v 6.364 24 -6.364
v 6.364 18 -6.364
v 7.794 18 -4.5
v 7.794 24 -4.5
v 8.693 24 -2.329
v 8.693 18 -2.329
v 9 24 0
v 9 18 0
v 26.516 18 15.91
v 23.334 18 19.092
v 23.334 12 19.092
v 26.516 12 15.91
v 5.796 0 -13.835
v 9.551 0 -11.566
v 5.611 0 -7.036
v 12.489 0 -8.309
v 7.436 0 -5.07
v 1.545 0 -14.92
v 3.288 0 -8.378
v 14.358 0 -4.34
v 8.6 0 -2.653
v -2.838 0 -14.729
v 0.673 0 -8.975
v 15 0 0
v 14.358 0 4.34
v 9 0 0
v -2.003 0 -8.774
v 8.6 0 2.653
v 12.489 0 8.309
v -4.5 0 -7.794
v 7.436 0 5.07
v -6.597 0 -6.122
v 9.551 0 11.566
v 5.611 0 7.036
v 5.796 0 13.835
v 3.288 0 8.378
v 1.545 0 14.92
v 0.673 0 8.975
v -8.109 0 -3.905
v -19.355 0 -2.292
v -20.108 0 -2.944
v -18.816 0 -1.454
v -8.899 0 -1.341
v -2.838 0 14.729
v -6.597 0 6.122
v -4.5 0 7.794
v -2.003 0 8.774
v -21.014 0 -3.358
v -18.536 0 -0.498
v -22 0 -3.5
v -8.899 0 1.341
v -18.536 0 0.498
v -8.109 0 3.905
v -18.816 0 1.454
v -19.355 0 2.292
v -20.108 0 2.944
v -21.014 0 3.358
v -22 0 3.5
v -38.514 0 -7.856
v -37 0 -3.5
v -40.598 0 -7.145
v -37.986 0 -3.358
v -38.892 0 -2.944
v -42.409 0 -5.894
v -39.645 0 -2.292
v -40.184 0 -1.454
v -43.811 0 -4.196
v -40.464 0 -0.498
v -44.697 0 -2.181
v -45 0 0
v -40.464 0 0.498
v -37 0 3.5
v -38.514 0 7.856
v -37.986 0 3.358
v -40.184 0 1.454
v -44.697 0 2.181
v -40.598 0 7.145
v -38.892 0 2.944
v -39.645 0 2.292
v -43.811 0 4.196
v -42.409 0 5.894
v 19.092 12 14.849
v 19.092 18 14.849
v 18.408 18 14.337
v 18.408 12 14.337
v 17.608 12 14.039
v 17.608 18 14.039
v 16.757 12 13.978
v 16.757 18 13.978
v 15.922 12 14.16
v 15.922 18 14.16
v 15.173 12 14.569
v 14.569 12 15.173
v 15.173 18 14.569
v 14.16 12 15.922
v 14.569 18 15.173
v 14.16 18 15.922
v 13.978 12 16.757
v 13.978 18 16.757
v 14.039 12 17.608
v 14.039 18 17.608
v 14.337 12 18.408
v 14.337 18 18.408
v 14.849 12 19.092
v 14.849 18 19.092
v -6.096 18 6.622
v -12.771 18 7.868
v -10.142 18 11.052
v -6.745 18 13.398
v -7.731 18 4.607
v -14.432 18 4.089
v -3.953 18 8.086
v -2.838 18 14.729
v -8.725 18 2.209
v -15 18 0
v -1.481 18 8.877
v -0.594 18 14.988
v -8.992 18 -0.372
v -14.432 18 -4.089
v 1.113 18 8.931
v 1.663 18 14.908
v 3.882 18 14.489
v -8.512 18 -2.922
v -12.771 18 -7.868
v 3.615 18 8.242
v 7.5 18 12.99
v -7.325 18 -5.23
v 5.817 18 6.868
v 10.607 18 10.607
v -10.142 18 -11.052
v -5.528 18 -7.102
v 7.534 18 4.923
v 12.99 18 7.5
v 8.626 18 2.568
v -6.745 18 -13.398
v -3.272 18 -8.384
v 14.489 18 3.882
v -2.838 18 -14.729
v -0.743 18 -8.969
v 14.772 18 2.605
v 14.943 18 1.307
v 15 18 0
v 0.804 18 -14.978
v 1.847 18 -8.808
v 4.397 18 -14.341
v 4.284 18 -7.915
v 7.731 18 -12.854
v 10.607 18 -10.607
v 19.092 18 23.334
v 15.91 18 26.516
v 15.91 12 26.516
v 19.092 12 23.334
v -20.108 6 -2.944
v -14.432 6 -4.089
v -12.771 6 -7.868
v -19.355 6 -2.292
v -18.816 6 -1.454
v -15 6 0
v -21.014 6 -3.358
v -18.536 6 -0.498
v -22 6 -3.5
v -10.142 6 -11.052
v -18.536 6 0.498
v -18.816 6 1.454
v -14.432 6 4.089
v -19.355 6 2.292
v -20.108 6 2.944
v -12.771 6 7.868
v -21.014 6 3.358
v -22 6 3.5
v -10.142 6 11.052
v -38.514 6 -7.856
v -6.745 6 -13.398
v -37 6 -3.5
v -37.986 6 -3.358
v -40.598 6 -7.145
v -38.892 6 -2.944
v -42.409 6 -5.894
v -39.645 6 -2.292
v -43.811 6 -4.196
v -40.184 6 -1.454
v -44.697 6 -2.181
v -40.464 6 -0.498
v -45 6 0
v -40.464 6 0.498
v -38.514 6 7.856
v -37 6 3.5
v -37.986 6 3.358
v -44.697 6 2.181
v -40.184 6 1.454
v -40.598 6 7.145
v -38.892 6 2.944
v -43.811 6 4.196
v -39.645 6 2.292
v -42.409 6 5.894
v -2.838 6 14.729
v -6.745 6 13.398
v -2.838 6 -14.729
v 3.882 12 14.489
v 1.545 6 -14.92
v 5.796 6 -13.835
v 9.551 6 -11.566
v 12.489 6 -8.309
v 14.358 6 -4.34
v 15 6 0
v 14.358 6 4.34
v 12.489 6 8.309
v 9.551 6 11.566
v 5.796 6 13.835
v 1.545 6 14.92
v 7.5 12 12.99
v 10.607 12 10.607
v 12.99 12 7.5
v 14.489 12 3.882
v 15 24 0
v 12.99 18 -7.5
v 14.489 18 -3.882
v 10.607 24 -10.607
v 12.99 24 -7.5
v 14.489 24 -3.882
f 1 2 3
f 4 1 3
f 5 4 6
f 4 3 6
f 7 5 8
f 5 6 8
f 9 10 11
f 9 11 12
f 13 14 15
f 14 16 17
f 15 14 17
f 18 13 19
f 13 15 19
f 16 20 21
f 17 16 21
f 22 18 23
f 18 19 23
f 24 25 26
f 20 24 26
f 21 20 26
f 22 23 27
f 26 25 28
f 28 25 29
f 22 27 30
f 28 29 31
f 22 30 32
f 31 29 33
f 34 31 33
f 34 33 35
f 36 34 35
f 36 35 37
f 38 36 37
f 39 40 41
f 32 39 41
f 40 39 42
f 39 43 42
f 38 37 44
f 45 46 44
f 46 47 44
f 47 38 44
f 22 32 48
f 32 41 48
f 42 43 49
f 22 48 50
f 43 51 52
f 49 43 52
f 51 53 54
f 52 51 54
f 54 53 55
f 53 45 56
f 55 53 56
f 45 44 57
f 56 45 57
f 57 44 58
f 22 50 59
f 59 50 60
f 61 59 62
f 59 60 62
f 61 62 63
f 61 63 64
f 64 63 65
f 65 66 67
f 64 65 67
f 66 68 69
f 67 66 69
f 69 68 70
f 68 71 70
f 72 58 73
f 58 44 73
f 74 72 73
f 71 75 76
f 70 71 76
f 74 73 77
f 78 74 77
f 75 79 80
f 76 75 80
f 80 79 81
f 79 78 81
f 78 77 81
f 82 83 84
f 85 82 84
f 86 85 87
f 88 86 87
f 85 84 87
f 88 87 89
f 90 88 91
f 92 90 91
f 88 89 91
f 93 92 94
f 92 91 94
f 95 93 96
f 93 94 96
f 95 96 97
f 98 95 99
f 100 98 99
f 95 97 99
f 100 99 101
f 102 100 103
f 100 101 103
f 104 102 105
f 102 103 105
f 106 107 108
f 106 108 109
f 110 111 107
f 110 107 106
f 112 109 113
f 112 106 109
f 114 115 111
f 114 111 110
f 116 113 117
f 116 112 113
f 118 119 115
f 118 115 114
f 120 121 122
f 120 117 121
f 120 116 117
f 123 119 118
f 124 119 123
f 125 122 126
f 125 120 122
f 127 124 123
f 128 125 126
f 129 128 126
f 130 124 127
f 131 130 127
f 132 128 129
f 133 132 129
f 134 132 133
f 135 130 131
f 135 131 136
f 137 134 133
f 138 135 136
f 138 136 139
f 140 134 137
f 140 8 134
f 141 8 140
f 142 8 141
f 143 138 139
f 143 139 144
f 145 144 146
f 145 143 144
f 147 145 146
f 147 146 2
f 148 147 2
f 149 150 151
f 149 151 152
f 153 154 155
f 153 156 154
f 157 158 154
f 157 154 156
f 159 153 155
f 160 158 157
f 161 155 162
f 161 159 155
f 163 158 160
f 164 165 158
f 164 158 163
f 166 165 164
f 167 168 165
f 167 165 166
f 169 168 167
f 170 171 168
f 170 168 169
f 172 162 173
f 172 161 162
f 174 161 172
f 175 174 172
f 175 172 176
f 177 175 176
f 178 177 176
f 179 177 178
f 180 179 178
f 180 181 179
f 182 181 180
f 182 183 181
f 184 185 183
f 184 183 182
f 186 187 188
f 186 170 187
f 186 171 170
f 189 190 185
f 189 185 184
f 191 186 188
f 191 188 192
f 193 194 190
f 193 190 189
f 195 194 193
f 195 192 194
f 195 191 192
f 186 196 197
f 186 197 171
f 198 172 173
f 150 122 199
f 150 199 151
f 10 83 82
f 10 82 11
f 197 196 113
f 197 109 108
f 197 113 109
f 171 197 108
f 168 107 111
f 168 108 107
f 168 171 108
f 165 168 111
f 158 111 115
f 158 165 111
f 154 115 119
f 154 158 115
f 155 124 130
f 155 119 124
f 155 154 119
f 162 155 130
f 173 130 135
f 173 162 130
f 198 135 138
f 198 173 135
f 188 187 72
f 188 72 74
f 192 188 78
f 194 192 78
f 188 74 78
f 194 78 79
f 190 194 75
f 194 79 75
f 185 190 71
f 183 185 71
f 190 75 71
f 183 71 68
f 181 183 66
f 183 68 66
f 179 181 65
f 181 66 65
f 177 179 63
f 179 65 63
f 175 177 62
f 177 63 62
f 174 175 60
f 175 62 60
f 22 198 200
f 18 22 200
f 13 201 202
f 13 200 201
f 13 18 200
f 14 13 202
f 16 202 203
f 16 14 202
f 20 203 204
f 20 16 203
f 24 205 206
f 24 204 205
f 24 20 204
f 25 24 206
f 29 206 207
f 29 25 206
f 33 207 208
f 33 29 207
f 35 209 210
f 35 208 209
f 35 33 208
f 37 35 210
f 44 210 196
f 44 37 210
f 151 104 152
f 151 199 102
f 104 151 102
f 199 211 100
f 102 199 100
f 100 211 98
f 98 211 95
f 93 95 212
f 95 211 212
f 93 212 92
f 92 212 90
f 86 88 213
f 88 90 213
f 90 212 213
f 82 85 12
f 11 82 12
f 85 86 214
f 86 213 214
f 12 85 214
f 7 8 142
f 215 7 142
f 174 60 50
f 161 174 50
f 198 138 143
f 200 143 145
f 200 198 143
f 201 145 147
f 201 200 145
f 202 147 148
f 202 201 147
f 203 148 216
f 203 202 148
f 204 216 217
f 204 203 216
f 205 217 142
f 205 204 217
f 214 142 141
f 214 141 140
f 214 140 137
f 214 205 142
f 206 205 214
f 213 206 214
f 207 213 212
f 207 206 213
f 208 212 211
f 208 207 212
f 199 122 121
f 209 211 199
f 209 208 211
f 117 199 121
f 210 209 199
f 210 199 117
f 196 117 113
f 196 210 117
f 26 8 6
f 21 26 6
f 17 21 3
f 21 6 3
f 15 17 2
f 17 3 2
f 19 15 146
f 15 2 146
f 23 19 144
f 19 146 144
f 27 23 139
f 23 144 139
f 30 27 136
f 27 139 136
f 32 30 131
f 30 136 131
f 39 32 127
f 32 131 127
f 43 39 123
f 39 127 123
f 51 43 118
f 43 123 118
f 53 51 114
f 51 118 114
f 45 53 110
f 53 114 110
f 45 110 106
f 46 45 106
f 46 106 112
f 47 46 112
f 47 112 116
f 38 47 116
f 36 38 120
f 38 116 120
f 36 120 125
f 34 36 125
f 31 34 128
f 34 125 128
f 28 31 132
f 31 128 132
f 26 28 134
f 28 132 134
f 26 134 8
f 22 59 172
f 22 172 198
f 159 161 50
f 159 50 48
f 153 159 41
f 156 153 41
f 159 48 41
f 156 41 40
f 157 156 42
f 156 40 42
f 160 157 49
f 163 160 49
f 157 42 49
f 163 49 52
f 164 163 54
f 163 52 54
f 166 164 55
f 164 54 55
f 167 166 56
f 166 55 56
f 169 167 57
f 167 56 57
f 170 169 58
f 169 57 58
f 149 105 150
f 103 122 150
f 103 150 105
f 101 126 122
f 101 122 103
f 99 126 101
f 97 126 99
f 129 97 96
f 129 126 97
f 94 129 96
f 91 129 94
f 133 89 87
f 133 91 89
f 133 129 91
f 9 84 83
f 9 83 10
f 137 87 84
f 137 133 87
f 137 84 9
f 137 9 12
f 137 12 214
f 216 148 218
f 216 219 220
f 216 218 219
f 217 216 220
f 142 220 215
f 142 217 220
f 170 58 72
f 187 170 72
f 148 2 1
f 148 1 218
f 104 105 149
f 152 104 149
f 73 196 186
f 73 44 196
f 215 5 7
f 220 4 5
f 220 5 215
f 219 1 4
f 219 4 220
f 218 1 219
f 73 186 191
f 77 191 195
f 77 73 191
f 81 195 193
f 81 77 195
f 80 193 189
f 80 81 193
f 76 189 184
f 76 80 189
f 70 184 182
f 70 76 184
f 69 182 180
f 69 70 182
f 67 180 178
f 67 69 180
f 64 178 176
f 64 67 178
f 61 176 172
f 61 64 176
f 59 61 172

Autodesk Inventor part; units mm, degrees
ref_plane "YZ Plane" through (0, 0, 0) normal (1, 0, 0) x (0, 1, 0)
ref_plane "XZ Plane" through (0, 0, 0) normal (0, 1, 0) x (-1, 0, 0)
ref_plane "XY Plane" through (0, 0, 0) normal (0, 0, 1) x (1, 0, 0)
sketch "草图1" plane through (0, 0, 0) normal (0, 1, 0) x (-1, 0, 0)
  circle A0 centre (0, 0) radius 15
  arc A1 (38.5135, -7.8555) -> (38.5135, 7.8555) centre (37, 0) ccw
  line L0 (38.5135, -7.8555) -> (2.8378, -14.7291)
  line L1 (2.8378, 14.7291) -> (39.6131, 7.6437)
  line L2 (50.7291, 0) -> (-22.1307, 0)
  arc A2 (37, -3.5) -> (37, 3.5) centre (37, 0) ccw
  arc A3 (22, 3.5) -> (22, -3.5) centre (22, 0) ccw
  line L3 (37, -3.5) -> (22, -3.5)
  line L4 (22, 3.5) -> (37, 3.5)
  dimension "d0" = 30
  dimension "d1" = 16
  dimension "d2" = 37
  dimension "d3" = 7
  dimension "d4" = 7
  dimension "d5" = 15
extrude "拉伸1" add sketch "草图1" along normal blind 6 contours L2 A0 | L2 A3 L3 A2 A1 L0 A0 | A0 L1 A1 L2 A2 L4 A3 | A0 L2
sketch "草图2" plane through (0, 6, 0) normal (0, 1, 0) x (1, 0, 0)
  line L0 (-37, 3.5) -> (-22, 3.5) projected
  arc A0 (-22, -3.5) -> (-22, 3.5) centre (-22, 0) ccw projected
  line L1 (-22, -3.5) -> (-37, -3.5) projected
  arc A1 (-37, 3.5) -> (-37, -3.5) centre (-37, 0) ccw projected
  arc A2 (-38.5135, 7.8555) -> (-38.5135, -7.8555) centre (-37, 0) ccw projected
  line L2 (-38.5135, -7.8555) -> (-2.8378, -14.7291) projected
  arc A3 (-2.8378, -14.7291) -> (-2.8378, 14.7291) centre (0, 0) ccw projected
  line L3 (-2.8378, 14.7291) -> (-38.5135, 7.8555) projected
  circle A4 centre (0, 0) radius 15
extrude "拉伸2" add sketch "草图2" along normal blind 12 contours A3 A4
sketch "草图3" plane through (0, 18, 0) normal (0, 1, 0) x (1, 0, 0)
  circle A0 centre (0, 0) radius 15 projected
  circle A1 centre (0, 0) radius 9
  dimension "d10" = 18
extrude "拉伸3" cut sketch "草图3" against normal blind 20 contours A1
sketch "草图4" plane through (0, 18, 0) normal (0, 1, 0) x (1, 0, 0)
  circle A0 centre (0, 0) radius 9 projected
  circle A1 centre (0, 0) radius 15 projected
  line L0 (9, 0) -> (15, 0)
  line L1 (6.364, 6.364) -> (10.6066, 10.6066)
  dimension "d13" = 45
extrude "拉伸4" add sketch "草图4" along normal blind 6 contours A0 L1 A1 L0 picked at (12.295, 4.0369)
sketch "草图5" plane through (0, 18, 0) normal (0, 1, 0) x (1, 0, 0)
  arc A0 (10.6066, 10.6066) -> (15, 0) centre (0, 0) ccw projected
  line L0 (15, 0) -> (9, 0) projected
  arc A1 (6.364, 6.364) -> (9, 0) centre (0, 0) ccw projected
  line L1 (0, 0) -> (21.2132, -21.2132) construction
  line L2 (26.5165, -15.9099) -> (14.4889, -3.8823)
  line L3 (3.8823, -14.4889) -> (15.9099, -26.5165)
  line L4 (26.5165, -15.9099) -> (1.7678, -12.3744) construction
  line L5 (12.3744, -1.7678) -> (15.9099, -26.5165) construction
  arc A2 (19.0919, -14.8492) -> (14.8492, -19.0919) centre (16.9706, -16.9706) ccw
  line L6 (14.8492, -19.0919) -> (19.0919, -23.3345)
  line L7 (19.0919, -14.8492) -> (23.3345, -19.0919)
  line L8 (15.9099, -26.5165) -> (19.0919, -23.3345)
  line L9 (23.3345, -19.0919) -> (26.5165, -15.9099)
  point P0 (14.1421, -14.1421)
  dimension "d16" = 45
  dimension "d17" = 15
  dimension "d20" = 6
extrude "拉伸5" add sketch "草图5" against normal blind 6
